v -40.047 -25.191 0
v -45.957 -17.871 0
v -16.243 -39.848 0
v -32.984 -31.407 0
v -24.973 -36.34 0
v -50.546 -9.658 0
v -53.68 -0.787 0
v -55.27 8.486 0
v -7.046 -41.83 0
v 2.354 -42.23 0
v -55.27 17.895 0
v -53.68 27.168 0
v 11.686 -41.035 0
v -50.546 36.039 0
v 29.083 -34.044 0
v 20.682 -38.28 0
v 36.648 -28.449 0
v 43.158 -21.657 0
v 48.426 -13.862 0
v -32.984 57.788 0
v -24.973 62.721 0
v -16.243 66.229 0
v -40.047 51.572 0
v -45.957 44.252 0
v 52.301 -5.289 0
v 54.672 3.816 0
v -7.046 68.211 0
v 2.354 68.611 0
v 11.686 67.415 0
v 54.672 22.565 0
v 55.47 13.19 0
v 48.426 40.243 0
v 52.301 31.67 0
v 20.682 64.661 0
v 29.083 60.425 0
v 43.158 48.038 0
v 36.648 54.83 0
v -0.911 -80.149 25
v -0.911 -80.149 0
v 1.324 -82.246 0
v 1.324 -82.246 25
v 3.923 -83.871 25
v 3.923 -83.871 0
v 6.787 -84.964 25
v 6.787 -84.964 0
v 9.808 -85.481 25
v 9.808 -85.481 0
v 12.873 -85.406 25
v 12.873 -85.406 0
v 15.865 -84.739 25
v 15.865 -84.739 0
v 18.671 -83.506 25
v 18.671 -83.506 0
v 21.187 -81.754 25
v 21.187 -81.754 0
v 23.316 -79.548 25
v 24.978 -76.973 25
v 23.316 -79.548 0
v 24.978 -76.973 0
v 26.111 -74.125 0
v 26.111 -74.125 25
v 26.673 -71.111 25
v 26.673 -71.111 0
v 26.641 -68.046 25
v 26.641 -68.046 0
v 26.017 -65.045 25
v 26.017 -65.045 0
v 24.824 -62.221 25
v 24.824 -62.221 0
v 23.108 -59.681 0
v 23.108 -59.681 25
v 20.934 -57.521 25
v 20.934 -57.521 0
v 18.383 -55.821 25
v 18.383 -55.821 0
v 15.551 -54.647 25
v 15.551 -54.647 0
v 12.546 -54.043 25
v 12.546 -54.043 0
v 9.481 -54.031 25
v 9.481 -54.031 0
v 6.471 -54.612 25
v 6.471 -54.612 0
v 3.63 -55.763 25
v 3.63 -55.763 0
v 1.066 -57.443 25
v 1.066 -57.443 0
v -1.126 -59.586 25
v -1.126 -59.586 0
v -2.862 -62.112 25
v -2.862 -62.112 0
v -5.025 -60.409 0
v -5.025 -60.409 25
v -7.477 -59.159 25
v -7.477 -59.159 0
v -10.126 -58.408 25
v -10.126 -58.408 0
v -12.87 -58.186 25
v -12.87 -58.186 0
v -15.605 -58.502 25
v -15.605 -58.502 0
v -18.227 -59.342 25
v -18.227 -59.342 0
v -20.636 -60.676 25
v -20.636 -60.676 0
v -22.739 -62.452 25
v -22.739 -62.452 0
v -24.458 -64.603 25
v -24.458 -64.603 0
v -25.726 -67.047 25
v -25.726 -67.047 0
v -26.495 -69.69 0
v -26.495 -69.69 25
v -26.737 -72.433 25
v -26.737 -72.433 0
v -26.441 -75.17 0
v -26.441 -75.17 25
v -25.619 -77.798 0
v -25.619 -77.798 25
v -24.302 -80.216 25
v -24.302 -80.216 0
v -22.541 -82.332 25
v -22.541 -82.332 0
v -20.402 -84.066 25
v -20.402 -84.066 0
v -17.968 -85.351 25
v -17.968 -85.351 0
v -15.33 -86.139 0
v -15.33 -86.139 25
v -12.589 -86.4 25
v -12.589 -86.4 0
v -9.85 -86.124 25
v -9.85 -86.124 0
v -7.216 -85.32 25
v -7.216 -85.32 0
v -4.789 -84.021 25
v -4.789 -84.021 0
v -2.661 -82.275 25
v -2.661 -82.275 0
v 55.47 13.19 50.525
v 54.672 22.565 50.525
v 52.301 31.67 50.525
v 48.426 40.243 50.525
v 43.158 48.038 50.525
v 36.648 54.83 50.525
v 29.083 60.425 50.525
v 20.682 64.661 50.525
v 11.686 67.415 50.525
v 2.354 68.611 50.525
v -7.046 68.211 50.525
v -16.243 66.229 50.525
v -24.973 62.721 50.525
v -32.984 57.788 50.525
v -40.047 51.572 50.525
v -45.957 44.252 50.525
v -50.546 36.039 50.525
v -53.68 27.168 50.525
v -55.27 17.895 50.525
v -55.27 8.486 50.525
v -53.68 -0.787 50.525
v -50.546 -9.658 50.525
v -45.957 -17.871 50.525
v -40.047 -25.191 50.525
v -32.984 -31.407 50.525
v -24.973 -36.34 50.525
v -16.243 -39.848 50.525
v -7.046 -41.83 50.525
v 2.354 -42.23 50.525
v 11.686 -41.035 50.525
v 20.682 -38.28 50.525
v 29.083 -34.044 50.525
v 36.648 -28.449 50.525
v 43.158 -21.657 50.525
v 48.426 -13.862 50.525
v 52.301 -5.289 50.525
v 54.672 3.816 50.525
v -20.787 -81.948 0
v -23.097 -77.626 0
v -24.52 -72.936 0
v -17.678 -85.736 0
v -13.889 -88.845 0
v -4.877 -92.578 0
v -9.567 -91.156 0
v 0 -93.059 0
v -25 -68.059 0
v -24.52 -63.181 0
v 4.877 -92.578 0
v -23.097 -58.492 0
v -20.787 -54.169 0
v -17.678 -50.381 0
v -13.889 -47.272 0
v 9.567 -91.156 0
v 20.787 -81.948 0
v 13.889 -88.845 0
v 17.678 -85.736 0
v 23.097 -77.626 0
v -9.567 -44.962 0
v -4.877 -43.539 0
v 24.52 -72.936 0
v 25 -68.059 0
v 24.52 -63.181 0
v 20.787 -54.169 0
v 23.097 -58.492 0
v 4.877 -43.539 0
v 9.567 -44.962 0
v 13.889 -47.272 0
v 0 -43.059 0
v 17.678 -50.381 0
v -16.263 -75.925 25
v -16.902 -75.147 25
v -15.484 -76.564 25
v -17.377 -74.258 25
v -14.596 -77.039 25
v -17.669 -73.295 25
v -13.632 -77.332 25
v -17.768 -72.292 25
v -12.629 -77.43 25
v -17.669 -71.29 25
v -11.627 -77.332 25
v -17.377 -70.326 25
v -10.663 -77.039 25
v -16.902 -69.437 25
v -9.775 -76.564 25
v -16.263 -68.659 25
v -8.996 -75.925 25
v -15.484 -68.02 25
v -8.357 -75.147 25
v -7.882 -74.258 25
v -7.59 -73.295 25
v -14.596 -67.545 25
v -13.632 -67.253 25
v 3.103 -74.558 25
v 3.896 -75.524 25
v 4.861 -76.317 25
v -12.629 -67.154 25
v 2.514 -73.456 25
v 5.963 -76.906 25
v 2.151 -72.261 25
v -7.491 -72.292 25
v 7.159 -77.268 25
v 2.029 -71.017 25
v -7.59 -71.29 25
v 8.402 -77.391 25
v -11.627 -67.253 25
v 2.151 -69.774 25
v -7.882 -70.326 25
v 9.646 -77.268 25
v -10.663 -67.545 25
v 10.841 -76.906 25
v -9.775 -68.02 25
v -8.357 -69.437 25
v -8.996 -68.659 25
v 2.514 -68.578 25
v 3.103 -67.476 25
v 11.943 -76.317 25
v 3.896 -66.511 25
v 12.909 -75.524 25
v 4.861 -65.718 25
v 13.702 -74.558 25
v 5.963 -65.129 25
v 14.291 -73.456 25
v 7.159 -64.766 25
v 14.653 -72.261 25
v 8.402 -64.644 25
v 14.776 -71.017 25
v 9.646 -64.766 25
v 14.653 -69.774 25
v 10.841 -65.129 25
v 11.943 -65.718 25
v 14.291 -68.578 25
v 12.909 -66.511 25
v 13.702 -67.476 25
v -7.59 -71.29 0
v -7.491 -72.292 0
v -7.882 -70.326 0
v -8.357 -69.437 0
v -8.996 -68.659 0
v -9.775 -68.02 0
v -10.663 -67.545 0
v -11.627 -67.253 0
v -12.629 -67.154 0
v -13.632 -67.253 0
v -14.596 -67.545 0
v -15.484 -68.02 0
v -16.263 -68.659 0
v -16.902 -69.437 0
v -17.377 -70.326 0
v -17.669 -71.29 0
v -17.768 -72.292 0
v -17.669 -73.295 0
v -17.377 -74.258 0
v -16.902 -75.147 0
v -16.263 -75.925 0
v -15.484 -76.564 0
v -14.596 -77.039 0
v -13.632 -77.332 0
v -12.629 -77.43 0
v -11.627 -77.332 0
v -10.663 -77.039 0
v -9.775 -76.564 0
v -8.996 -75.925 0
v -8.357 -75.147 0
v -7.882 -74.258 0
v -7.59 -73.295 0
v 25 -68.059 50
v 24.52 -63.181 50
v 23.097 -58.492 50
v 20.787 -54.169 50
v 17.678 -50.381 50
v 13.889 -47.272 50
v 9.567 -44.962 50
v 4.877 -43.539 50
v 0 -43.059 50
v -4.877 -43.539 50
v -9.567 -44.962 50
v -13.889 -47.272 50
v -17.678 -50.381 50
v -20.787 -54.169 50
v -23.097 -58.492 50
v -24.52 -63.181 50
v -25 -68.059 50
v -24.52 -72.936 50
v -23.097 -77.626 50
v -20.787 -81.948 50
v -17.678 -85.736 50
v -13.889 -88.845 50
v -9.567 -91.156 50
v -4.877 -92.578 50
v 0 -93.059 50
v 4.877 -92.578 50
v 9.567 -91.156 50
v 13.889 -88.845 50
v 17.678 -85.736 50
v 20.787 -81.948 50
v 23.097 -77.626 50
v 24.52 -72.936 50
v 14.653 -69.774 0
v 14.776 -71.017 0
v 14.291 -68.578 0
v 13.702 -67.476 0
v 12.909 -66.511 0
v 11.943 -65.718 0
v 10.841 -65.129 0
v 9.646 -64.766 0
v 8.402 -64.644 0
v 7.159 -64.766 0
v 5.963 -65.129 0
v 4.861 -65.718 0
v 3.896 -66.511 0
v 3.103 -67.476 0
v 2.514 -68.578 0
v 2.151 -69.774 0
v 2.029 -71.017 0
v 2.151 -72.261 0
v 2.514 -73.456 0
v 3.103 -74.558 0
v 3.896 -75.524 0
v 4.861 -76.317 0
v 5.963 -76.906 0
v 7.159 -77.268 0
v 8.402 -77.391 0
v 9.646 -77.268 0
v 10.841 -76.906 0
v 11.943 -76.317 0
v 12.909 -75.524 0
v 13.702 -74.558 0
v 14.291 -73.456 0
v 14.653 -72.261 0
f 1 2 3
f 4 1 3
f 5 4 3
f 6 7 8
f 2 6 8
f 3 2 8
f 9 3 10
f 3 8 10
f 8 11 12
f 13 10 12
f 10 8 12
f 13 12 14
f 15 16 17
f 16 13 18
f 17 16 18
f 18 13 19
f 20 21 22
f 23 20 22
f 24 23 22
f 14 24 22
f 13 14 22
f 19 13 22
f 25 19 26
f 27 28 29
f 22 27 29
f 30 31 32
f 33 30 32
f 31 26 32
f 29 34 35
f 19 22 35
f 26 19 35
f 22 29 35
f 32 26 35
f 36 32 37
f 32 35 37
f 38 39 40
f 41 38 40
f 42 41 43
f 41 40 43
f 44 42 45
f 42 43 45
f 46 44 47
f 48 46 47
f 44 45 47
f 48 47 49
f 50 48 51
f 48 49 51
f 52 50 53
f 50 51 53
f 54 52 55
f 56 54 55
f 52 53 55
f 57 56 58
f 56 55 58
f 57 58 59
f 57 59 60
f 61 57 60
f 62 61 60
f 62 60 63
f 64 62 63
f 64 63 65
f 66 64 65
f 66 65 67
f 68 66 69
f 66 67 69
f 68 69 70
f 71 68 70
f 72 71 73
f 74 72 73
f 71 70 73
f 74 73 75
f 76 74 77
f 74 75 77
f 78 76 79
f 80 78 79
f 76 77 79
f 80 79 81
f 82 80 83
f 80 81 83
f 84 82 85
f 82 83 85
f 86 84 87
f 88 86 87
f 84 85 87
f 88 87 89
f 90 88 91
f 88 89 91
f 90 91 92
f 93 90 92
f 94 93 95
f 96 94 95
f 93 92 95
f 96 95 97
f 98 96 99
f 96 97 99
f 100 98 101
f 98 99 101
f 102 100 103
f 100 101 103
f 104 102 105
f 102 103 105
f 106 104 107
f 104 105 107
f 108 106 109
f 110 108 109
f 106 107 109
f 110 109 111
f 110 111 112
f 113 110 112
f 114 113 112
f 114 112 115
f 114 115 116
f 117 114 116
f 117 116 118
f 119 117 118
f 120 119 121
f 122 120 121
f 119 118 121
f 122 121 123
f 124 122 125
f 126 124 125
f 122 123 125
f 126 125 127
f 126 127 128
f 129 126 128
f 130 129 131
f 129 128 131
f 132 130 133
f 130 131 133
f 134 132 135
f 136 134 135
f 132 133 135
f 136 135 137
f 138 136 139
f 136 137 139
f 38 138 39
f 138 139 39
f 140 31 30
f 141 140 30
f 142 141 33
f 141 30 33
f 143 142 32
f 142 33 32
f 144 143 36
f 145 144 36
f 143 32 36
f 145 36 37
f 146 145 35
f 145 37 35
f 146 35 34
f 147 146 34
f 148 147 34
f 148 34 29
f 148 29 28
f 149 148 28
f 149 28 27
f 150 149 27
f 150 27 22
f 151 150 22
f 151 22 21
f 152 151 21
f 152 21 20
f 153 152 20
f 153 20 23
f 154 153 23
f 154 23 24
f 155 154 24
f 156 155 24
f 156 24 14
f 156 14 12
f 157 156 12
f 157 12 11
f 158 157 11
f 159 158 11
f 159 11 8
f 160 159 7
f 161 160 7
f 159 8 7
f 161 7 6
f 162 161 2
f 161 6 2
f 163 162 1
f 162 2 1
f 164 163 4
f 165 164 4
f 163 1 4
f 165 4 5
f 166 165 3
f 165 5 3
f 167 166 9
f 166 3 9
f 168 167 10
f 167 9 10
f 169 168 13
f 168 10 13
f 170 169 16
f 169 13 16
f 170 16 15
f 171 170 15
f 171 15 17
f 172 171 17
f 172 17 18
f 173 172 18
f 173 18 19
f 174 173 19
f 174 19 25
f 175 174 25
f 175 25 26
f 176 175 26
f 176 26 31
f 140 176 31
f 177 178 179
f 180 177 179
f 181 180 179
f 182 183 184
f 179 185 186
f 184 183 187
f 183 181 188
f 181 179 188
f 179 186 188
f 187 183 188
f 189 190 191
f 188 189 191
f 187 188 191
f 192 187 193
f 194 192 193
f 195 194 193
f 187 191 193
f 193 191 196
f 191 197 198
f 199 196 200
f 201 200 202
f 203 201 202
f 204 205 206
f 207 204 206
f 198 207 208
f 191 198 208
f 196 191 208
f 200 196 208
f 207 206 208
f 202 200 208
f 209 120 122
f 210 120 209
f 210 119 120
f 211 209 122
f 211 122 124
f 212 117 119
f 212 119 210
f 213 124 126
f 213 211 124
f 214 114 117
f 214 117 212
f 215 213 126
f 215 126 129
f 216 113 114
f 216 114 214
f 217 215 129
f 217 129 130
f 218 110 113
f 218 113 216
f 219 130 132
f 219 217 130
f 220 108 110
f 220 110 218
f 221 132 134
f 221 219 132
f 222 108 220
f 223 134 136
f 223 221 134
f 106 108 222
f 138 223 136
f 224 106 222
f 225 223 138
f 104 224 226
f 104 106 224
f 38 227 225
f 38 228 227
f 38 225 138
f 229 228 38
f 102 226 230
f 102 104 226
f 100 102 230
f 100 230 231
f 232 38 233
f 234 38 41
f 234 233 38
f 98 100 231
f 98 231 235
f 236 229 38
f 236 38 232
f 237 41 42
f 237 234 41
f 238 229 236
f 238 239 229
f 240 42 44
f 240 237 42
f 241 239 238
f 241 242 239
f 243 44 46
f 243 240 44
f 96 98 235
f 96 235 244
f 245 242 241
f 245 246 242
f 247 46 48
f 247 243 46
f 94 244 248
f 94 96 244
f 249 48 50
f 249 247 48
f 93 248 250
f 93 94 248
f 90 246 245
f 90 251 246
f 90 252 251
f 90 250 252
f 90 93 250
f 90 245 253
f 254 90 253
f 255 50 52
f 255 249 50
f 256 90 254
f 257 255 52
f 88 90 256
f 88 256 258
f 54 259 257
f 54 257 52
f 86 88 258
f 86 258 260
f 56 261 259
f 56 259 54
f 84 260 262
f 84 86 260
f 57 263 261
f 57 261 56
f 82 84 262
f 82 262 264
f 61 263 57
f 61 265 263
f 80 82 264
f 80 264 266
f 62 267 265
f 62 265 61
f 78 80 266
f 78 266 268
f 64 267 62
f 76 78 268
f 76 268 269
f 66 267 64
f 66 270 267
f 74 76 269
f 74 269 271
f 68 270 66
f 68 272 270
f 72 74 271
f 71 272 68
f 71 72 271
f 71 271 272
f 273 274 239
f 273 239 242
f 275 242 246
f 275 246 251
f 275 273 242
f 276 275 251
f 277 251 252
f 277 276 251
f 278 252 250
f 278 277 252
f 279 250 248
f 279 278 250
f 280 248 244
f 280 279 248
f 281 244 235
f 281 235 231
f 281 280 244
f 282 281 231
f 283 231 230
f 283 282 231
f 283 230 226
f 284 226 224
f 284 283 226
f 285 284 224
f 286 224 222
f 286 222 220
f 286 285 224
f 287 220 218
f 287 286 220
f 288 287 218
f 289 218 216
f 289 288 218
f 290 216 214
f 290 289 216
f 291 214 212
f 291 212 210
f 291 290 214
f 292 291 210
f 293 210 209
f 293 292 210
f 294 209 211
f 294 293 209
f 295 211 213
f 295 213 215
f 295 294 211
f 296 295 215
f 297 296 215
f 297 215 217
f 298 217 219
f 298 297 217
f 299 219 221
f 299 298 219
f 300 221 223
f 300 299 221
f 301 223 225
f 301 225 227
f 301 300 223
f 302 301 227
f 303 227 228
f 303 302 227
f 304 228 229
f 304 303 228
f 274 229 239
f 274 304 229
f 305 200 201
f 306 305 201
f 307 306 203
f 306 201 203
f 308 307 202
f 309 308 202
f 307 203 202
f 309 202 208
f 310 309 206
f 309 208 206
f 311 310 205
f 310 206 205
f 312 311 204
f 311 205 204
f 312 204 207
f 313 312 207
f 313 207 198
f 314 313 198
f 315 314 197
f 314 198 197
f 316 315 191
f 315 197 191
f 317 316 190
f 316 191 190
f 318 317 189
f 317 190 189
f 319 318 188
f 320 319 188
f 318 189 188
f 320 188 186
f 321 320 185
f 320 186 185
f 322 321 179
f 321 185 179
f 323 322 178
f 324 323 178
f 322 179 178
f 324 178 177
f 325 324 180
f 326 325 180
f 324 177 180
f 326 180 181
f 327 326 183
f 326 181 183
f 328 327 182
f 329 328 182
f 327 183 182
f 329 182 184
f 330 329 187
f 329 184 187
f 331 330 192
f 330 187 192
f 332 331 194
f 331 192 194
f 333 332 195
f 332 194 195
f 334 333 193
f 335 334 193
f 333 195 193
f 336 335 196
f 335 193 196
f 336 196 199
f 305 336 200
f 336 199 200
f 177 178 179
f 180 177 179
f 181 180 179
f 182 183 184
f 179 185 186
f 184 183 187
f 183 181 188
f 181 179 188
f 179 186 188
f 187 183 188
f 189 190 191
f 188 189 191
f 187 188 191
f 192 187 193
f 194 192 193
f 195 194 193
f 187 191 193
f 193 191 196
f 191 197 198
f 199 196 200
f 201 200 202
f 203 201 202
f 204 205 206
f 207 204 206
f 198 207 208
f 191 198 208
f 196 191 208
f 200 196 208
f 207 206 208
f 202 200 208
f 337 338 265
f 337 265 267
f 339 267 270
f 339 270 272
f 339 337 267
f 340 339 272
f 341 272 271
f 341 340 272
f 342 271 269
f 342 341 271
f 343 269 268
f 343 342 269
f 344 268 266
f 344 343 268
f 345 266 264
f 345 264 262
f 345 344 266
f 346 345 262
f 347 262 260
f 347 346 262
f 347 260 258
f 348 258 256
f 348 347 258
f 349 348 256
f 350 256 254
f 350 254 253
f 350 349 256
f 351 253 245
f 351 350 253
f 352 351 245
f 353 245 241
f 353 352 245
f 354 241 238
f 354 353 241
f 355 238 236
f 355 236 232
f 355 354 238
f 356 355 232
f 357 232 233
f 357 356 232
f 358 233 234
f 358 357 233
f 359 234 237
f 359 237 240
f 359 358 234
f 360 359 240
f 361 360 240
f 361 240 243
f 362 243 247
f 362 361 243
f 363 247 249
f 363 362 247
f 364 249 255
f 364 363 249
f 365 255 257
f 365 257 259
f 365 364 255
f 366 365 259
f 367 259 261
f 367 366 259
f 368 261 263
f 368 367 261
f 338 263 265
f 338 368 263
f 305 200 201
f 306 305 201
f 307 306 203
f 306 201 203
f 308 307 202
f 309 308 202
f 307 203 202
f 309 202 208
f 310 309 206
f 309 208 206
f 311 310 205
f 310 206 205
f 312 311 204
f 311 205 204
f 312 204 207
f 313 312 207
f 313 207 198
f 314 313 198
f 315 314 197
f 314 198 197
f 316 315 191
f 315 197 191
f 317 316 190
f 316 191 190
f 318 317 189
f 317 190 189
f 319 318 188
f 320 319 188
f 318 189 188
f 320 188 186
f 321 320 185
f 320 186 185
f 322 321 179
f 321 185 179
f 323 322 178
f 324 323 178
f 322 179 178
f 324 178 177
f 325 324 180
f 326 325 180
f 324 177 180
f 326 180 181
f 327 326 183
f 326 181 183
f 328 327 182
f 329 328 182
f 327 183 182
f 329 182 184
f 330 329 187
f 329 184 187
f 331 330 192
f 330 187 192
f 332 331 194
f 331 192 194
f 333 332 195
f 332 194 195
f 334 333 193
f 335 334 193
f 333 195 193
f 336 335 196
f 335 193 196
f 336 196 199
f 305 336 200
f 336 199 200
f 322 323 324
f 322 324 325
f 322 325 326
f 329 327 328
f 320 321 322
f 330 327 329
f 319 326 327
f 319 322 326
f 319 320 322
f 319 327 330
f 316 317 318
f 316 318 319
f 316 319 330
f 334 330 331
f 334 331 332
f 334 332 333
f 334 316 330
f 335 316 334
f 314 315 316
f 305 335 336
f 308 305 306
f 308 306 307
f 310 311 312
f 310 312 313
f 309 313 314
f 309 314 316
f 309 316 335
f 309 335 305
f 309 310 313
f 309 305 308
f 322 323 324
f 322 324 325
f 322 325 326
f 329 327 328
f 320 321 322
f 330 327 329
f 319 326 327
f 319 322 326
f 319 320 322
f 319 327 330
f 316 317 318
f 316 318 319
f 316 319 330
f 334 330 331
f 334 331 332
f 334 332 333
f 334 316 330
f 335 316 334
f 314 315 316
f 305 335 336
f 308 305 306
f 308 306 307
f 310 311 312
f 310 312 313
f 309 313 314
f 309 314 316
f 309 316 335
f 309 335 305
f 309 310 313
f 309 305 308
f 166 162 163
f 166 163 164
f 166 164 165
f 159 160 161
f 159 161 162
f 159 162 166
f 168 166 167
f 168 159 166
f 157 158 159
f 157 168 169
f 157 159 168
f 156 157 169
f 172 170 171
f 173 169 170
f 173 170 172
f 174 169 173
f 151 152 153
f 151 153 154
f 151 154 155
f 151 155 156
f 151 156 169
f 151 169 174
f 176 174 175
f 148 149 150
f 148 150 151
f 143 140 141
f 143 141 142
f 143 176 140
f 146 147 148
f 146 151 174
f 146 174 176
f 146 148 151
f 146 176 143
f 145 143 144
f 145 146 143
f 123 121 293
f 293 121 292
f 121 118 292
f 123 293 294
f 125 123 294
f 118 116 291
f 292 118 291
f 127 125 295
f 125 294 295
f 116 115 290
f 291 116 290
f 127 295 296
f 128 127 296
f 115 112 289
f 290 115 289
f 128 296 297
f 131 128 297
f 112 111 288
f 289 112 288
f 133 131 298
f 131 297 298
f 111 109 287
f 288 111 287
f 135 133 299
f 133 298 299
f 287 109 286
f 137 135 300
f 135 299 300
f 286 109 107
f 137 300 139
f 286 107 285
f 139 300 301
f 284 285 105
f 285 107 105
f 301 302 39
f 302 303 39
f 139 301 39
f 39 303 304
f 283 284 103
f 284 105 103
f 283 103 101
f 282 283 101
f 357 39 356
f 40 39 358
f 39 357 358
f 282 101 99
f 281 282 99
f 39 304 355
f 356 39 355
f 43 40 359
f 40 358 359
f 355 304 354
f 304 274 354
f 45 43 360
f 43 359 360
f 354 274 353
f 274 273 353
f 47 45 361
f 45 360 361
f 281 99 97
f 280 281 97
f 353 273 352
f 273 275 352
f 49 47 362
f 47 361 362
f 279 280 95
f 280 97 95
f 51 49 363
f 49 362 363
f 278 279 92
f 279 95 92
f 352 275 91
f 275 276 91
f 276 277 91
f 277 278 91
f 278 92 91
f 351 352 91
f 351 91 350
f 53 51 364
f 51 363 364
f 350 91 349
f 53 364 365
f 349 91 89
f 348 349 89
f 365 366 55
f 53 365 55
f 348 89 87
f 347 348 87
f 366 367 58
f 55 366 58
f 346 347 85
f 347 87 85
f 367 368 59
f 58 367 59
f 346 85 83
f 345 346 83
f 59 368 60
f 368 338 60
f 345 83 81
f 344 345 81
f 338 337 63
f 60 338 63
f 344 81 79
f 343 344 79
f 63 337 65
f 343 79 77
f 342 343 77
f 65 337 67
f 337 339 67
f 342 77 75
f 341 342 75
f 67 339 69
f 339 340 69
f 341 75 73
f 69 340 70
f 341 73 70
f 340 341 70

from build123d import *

# Parameters (mm, degrees)
F1_R     = 25
F2_DEPTH = 50
F0_R     = 25
F3_R     = 55.4700829566
F4_DEPTH = 37.87109
F5_R     = 6.3735231856
F5_R_2   = 5.1382942436
F6_DEPTH = 25
F7_DEPTH = 50.52546


with BuildPart() as f2:
    # F1 (on face) → F2 (new body)
    with BuildSketch(Plane.XY):
        with Locations((0, -68.0586513998)):
            Circle(F1_R)
    extrude(amount=F2_DEPTH)


with BuildPart() as f2b:
    # F0 (on Top) → F2, piece 2 (new body)
    with BuildSketch(Plane.XY):
        with Locations((0, -68.0586513998)):
            Circle(F0_R)
    extrude(amount=F2_DEPTH)


with BuildPart() as f4:
    # F3 (on Top) → F4 (new body)
    with BuildSketch(Plane.XY):
        with Locations((0, 13.1904222071)):
            Circle(F3_R)
    extrude(amount=F4_DEPTH)

    # F7 (add): a face of the model
    f7_faces = [f4.faces().sort_by_distance(p)[0] for p in [
        (0, 13.1904222071, 0),
    ]]
    extrude(f7_faces, amount=-F7_DEPTH)


with BuildPart() as f6:
    # F5 (on Top) → F6 (new body)
    with BuildSketch(Plane.XY):
        with BuildLine():
            ThreePointArc((-0.91149976, -80.1486454122), (0.8678235149, -76.3981207113), (1.4785570202, -72.2920969129))
            ThreePointArc((1.4785570202, -72.2920969129), (0.3482401963, -66.758983111), (-2.8615905806, -62.1124843378))
            ThreePointArc((-2.8615905806, -62.1124843378), (-4.7373627223, -71.4387986015), (-0.91149976, -80.1486454122))
        make_face()
        with BuildLine():
            ThreePointArc((-2.8615905806, -62.1124843378), (0.3482401963, -66.758983111), (1.4785570202, -72.2920969129))
            ThreePointArc((1.4785570202, -72.2920969129), (0.8678235149, -76.3981207113), (-0.91149976, -80.1486454122))
            ThreePointArc((-0.91149976, -80.1486454122), (16.5111622818, -84.5111608851), (26.7320689194, -69.7424858809))
            ThreePointArc((26.7320689194, -69.7424858809), (14.8913945195, -54.4617659522), (-2.8615905806, -62.1124843378))
        make_face()
        with Locations((8.402325213, -71.017280221)):
            Circle(F5_R, mode=Mode.SUBTRACT)
        with BuildLine():
            ThreePointArc((-0.91149976, -80.1486454122), (-4.7373627223, -71.4387986015), (-2.8615905806, -62.1124843378))
            ThreePointArc((-2.8615905806, -62.1124843378), (-26.6556478788, -73.8086292163), (-0.91149976, -80.1486454122))
        make_face()
        with Locations((-12.6294186339, -72.2920969129)):
            Circle(F5_R_2, mode=Mode.SUBTRACT)
    extrude(amount=F6_DEPTH)


solid = Compound([f2.part, f2b.part, f4.part, f6.part])
